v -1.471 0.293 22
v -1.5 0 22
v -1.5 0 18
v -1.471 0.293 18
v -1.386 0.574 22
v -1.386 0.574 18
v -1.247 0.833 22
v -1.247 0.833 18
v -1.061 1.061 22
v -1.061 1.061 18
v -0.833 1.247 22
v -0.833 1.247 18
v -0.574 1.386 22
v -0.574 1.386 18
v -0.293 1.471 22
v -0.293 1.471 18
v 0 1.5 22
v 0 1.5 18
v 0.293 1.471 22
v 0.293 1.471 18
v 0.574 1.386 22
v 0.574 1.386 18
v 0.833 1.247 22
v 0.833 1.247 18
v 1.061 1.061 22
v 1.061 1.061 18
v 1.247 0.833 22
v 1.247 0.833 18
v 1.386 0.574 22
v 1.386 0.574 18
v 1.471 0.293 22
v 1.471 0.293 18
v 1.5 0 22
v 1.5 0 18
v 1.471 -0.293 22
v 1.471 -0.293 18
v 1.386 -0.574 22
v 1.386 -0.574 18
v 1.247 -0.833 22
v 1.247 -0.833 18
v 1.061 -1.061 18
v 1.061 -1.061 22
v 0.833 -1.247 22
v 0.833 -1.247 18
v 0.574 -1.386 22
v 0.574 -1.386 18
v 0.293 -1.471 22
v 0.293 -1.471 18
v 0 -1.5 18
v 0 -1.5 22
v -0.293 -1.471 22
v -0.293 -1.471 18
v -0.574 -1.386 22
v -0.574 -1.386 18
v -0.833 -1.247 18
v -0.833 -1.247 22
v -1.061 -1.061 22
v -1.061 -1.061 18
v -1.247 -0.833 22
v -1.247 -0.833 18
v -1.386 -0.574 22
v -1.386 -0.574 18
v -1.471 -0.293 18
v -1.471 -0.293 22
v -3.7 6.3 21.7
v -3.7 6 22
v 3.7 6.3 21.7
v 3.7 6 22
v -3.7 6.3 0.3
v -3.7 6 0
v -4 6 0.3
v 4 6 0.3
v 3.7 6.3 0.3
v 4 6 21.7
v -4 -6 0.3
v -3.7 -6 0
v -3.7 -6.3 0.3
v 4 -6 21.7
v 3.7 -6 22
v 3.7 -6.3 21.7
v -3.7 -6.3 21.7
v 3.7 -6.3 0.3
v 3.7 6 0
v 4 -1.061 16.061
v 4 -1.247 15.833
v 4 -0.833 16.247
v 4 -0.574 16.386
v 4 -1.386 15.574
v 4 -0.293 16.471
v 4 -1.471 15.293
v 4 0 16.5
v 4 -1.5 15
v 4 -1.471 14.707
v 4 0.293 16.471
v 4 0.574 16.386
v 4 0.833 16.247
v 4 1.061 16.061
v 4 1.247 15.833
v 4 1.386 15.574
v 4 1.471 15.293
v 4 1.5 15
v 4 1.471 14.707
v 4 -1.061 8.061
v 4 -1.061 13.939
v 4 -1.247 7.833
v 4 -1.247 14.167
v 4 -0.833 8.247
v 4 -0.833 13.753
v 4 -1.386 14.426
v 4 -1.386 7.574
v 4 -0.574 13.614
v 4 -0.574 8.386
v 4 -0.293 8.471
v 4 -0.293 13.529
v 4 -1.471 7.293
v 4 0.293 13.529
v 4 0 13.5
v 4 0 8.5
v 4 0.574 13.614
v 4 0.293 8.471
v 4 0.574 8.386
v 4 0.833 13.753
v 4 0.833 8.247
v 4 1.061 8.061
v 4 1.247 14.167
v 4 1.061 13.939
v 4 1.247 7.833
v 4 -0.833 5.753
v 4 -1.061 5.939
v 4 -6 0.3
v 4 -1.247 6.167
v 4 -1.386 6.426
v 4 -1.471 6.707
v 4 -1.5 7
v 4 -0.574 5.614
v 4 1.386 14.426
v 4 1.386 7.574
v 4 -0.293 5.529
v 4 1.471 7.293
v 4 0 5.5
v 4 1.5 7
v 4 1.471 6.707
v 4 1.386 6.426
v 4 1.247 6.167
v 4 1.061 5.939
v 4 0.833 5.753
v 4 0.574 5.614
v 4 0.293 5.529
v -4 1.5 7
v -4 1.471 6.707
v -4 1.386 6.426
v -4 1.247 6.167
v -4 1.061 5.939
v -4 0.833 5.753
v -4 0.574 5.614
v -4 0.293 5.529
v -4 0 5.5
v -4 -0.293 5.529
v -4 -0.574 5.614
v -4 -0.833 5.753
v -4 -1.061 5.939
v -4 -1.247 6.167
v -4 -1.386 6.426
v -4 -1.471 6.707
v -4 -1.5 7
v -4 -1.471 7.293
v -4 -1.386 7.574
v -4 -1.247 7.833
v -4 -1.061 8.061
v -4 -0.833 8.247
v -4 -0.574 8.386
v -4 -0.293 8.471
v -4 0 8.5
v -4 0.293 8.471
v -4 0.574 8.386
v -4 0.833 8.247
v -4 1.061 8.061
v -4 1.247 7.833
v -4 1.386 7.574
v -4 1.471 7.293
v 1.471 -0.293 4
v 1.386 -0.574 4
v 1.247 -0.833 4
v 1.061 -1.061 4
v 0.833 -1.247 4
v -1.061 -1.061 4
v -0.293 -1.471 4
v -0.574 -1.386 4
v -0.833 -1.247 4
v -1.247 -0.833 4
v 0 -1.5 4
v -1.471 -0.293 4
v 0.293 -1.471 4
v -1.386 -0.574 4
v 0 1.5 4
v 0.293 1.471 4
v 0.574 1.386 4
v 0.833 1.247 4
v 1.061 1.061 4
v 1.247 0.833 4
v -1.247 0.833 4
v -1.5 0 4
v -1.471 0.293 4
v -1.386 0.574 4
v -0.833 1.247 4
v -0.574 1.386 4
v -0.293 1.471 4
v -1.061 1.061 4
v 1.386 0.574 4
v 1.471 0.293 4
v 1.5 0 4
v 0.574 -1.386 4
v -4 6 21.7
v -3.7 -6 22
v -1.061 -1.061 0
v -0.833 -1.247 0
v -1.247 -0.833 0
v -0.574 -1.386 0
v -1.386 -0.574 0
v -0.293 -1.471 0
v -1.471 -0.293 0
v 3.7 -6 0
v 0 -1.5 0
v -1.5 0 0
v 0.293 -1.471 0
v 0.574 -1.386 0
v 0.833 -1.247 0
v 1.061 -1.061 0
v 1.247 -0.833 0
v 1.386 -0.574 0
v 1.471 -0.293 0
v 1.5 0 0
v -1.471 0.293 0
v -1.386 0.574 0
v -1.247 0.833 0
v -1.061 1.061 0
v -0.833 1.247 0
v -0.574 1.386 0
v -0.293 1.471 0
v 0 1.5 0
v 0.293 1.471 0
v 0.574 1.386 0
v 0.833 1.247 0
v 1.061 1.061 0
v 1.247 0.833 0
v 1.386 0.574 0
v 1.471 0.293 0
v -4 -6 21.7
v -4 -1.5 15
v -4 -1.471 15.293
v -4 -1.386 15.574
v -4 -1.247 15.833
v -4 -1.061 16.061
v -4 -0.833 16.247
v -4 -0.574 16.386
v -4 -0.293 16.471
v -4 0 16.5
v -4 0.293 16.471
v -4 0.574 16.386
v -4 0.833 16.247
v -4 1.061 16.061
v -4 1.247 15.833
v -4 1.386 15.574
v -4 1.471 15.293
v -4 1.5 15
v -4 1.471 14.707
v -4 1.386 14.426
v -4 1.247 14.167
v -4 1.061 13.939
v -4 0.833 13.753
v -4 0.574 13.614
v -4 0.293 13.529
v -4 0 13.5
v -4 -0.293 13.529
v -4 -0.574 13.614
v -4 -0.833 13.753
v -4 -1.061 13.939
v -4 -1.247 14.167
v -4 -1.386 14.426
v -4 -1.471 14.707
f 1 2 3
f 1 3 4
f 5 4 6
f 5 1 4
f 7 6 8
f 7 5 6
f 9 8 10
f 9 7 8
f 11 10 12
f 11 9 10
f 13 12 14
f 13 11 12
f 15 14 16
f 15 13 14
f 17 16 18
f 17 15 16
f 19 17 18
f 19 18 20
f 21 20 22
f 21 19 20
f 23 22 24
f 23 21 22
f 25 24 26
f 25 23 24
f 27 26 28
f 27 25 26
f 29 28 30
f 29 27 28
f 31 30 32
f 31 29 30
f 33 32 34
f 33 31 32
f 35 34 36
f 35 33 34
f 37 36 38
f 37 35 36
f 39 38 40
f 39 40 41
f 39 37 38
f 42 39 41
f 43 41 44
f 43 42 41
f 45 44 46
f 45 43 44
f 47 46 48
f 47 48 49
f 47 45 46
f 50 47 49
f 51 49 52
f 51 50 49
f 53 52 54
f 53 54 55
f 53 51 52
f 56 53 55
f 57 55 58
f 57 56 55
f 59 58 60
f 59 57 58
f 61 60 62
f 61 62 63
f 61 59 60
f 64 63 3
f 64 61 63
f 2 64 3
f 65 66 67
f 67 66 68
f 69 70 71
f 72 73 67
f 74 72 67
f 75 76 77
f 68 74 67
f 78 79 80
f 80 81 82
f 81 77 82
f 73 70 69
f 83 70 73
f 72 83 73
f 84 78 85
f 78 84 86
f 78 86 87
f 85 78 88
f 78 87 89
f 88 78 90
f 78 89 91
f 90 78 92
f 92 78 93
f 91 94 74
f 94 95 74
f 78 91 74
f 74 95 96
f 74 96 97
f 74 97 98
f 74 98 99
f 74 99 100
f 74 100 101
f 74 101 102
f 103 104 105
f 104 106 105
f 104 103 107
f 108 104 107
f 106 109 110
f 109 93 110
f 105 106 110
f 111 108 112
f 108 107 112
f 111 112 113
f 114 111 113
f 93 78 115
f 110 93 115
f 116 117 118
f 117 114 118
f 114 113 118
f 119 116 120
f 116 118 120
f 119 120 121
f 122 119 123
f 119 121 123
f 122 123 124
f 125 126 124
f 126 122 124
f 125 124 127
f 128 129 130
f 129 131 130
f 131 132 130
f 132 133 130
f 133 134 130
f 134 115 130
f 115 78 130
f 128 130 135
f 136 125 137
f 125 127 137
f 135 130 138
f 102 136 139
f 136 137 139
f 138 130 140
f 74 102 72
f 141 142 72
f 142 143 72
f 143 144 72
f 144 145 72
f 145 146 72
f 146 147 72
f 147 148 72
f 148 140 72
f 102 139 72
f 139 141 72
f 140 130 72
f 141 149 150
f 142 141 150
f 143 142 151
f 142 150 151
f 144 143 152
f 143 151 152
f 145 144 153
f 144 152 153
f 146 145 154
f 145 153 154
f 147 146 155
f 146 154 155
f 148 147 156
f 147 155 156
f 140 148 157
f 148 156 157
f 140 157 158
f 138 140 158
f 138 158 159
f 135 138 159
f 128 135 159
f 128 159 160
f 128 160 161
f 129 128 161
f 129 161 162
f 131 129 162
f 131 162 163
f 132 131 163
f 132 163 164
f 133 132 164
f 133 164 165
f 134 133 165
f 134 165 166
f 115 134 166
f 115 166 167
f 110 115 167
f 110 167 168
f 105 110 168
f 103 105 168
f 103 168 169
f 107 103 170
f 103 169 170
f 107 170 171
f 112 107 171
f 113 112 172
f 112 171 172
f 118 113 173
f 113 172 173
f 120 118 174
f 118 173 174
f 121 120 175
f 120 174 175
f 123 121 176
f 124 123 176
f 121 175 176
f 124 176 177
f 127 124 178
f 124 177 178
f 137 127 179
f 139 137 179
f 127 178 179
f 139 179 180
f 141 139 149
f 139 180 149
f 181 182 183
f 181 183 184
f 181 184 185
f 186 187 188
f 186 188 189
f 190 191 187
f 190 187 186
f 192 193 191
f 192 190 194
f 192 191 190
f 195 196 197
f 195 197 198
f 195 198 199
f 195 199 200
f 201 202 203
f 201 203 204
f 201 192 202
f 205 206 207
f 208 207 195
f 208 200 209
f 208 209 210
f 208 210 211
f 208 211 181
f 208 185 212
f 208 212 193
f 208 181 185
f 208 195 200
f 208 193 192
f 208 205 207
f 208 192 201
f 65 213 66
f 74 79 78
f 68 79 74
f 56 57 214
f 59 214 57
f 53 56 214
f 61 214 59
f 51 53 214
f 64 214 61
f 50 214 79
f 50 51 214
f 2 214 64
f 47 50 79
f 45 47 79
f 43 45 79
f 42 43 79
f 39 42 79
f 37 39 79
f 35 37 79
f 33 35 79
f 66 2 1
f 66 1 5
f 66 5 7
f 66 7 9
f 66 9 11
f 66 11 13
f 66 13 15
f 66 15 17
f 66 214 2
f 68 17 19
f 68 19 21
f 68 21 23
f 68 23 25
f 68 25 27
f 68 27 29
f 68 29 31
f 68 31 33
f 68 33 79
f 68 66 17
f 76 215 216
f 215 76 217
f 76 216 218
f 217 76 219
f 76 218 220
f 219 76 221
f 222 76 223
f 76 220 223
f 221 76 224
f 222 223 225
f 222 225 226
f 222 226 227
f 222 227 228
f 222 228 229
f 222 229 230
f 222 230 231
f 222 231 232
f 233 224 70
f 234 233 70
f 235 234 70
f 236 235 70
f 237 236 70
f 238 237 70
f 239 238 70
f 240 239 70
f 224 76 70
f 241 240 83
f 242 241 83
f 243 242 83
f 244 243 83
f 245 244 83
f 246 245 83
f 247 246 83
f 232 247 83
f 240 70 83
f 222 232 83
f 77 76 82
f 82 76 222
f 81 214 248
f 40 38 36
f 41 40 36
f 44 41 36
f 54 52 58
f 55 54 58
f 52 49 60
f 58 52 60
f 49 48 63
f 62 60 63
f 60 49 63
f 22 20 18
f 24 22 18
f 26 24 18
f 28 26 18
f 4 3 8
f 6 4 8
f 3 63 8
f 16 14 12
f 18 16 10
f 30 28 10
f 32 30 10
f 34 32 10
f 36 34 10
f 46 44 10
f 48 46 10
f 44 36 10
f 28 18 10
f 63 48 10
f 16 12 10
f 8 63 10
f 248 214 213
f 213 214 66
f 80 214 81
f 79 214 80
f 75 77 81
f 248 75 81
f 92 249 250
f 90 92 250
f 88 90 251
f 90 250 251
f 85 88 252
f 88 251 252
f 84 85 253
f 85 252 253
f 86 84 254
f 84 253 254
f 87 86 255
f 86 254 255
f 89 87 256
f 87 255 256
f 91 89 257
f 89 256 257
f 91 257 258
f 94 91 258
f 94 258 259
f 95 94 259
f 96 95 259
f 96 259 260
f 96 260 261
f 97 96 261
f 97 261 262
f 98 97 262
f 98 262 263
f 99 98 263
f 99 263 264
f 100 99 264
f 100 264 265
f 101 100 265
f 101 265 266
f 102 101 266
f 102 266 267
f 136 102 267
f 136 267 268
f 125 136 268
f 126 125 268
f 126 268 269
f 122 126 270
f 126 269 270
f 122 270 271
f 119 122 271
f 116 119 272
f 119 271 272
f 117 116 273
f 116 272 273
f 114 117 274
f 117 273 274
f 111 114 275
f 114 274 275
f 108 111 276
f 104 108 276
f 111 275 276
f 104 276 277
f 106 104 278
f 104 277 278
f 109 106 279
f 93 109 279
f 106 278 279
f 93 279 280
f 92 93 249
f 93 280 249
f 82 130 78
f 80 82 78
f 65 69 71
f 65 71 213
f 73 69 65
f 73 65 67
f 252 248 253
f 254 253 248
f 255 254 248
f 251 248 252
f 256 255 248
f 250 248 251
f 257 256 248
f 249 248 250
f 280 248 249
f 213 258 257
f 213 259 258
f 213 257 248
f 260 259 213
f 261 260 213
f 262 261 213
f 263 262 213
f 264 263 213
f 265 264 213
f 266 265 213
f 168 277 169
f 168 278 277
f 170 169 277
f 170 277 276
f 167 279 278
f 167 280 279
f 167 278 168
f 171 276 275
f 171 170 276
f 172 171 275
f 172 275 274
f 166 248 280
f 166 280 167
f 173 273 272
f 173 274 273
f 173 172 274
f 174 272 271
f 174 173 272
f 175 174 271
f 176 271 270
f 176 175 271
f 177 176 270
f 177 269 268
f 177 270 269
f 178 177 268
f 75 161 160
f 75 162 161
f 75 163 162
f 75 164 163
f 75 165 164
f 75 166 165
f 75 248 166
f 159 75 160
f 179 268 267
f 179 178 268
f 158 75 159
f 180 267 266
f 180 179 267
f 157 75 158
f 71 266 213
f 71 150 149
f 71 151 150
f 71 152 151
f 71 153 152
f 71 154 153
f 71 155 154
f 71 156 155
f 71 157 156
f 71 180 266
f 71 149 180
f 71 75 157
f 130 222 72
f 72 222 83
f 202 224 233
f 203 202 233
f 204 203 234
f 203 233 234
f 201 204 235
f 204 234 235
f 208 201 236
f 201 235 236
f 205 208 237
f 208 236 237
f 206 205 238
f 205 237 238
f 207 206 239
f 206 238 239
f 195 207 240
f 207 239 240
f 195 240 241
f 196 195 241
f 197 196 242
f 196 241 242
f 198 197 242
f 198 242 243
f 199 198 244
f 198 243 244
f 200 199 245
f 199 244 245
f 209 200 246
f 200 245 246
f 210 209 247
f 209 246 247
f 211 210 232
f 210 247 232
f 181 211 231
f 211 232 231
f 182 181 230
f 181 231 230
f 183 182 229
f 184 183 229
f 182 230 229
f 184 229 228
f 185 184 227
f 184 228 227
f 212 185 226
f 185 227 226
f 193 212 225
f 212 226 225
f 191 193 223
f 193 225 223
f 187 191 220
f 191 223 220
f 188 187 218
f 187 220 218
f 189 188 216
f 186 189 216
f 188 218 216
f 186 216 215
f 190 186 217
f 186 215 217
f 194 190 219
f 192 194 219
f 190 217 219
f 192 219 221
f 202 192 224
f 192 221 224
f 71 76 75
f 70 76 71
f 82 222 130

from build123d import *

# Parameters (mm, degrees)
SKETCH_1_W          = 8
SKETCH_1_H          = 12.6
EXTRUDE_1_DEPTH     = 22
CHAMFER_1_SIZE      = 0.3
SKETCH_2_R          = 1.5
CUT_EXTRUDE_1_DEPTH = 25.242318371
SKETCH_3_R          = 1.5
CUT_EXTRUDE_2_DEPTH = 4


with BuildPart() as part:
    # 草图1 → 凸台-拉伸1 (new body)
    with BuildSketch(Plane.XY):
        Rectangle(SKETCH_1_W, SKETCH_1_H)
    extrude(amount=EXTRUDE_1_DEPTH)

    # 倒角1
    chamfer_1_edges = [part.edges().sort_by_distance(p)[0] for p in [
        (-4, 0, 22),
        (0, -6.3, 22),
        (4, 0, 22),
        (0, -6.3, 0),
        (-4, 0, 0),
        (0, 6.3, 0),
        (4, 0, 0),
        (4, -6.3, 11),
        (-4, -6.3, 11),
        (-4, 6.3, 11),
        (4, 6.3, 11),
        (0, 6.3, 22),
    ]]
    chamfer(chamfer_1_edges, length=CHAMFER_1_SIZE)

    # 草图2 → 切除-拉伸1 (cut, through all)
    with BuildSketch(Plane.ZY.offset(4)):
        with Locations(Location((15, 0, 0), (0, 0, 270))):
            Circle(SKETCH_2_R)
        with Locations(Location((7, 0, 0), (0, 0, 90))):
            Circle(SKETCH_2_R)
    extrude(amount=-CUT_EXTRUDE_1_DEPTH, mode=Mode.SUBTRACT)

    # 草图3 → 切除-拉伸2 (cut)
    with BuildSketch(Plane(origin=(0, 0, 0), x_dir=(-1, 0, 0), z_dir=(0, 0, -1))):
        Circle(SKETCH_3_R)
    cut_extrude_2 = extrude(amount=-CUT_EXTRUDE_2_DEPTH, mode=Mode.SUBTRACT)

    # 镜向1: 切除-拉伸2 across plane
    add(cut_extrude_2.mirror(Plane(origin=(0, 0, 11), x_dir=(1, 0, 0), z_dir=(0, 0, -1))), mode=Mode.SUBTRACT)


solid = part.part
